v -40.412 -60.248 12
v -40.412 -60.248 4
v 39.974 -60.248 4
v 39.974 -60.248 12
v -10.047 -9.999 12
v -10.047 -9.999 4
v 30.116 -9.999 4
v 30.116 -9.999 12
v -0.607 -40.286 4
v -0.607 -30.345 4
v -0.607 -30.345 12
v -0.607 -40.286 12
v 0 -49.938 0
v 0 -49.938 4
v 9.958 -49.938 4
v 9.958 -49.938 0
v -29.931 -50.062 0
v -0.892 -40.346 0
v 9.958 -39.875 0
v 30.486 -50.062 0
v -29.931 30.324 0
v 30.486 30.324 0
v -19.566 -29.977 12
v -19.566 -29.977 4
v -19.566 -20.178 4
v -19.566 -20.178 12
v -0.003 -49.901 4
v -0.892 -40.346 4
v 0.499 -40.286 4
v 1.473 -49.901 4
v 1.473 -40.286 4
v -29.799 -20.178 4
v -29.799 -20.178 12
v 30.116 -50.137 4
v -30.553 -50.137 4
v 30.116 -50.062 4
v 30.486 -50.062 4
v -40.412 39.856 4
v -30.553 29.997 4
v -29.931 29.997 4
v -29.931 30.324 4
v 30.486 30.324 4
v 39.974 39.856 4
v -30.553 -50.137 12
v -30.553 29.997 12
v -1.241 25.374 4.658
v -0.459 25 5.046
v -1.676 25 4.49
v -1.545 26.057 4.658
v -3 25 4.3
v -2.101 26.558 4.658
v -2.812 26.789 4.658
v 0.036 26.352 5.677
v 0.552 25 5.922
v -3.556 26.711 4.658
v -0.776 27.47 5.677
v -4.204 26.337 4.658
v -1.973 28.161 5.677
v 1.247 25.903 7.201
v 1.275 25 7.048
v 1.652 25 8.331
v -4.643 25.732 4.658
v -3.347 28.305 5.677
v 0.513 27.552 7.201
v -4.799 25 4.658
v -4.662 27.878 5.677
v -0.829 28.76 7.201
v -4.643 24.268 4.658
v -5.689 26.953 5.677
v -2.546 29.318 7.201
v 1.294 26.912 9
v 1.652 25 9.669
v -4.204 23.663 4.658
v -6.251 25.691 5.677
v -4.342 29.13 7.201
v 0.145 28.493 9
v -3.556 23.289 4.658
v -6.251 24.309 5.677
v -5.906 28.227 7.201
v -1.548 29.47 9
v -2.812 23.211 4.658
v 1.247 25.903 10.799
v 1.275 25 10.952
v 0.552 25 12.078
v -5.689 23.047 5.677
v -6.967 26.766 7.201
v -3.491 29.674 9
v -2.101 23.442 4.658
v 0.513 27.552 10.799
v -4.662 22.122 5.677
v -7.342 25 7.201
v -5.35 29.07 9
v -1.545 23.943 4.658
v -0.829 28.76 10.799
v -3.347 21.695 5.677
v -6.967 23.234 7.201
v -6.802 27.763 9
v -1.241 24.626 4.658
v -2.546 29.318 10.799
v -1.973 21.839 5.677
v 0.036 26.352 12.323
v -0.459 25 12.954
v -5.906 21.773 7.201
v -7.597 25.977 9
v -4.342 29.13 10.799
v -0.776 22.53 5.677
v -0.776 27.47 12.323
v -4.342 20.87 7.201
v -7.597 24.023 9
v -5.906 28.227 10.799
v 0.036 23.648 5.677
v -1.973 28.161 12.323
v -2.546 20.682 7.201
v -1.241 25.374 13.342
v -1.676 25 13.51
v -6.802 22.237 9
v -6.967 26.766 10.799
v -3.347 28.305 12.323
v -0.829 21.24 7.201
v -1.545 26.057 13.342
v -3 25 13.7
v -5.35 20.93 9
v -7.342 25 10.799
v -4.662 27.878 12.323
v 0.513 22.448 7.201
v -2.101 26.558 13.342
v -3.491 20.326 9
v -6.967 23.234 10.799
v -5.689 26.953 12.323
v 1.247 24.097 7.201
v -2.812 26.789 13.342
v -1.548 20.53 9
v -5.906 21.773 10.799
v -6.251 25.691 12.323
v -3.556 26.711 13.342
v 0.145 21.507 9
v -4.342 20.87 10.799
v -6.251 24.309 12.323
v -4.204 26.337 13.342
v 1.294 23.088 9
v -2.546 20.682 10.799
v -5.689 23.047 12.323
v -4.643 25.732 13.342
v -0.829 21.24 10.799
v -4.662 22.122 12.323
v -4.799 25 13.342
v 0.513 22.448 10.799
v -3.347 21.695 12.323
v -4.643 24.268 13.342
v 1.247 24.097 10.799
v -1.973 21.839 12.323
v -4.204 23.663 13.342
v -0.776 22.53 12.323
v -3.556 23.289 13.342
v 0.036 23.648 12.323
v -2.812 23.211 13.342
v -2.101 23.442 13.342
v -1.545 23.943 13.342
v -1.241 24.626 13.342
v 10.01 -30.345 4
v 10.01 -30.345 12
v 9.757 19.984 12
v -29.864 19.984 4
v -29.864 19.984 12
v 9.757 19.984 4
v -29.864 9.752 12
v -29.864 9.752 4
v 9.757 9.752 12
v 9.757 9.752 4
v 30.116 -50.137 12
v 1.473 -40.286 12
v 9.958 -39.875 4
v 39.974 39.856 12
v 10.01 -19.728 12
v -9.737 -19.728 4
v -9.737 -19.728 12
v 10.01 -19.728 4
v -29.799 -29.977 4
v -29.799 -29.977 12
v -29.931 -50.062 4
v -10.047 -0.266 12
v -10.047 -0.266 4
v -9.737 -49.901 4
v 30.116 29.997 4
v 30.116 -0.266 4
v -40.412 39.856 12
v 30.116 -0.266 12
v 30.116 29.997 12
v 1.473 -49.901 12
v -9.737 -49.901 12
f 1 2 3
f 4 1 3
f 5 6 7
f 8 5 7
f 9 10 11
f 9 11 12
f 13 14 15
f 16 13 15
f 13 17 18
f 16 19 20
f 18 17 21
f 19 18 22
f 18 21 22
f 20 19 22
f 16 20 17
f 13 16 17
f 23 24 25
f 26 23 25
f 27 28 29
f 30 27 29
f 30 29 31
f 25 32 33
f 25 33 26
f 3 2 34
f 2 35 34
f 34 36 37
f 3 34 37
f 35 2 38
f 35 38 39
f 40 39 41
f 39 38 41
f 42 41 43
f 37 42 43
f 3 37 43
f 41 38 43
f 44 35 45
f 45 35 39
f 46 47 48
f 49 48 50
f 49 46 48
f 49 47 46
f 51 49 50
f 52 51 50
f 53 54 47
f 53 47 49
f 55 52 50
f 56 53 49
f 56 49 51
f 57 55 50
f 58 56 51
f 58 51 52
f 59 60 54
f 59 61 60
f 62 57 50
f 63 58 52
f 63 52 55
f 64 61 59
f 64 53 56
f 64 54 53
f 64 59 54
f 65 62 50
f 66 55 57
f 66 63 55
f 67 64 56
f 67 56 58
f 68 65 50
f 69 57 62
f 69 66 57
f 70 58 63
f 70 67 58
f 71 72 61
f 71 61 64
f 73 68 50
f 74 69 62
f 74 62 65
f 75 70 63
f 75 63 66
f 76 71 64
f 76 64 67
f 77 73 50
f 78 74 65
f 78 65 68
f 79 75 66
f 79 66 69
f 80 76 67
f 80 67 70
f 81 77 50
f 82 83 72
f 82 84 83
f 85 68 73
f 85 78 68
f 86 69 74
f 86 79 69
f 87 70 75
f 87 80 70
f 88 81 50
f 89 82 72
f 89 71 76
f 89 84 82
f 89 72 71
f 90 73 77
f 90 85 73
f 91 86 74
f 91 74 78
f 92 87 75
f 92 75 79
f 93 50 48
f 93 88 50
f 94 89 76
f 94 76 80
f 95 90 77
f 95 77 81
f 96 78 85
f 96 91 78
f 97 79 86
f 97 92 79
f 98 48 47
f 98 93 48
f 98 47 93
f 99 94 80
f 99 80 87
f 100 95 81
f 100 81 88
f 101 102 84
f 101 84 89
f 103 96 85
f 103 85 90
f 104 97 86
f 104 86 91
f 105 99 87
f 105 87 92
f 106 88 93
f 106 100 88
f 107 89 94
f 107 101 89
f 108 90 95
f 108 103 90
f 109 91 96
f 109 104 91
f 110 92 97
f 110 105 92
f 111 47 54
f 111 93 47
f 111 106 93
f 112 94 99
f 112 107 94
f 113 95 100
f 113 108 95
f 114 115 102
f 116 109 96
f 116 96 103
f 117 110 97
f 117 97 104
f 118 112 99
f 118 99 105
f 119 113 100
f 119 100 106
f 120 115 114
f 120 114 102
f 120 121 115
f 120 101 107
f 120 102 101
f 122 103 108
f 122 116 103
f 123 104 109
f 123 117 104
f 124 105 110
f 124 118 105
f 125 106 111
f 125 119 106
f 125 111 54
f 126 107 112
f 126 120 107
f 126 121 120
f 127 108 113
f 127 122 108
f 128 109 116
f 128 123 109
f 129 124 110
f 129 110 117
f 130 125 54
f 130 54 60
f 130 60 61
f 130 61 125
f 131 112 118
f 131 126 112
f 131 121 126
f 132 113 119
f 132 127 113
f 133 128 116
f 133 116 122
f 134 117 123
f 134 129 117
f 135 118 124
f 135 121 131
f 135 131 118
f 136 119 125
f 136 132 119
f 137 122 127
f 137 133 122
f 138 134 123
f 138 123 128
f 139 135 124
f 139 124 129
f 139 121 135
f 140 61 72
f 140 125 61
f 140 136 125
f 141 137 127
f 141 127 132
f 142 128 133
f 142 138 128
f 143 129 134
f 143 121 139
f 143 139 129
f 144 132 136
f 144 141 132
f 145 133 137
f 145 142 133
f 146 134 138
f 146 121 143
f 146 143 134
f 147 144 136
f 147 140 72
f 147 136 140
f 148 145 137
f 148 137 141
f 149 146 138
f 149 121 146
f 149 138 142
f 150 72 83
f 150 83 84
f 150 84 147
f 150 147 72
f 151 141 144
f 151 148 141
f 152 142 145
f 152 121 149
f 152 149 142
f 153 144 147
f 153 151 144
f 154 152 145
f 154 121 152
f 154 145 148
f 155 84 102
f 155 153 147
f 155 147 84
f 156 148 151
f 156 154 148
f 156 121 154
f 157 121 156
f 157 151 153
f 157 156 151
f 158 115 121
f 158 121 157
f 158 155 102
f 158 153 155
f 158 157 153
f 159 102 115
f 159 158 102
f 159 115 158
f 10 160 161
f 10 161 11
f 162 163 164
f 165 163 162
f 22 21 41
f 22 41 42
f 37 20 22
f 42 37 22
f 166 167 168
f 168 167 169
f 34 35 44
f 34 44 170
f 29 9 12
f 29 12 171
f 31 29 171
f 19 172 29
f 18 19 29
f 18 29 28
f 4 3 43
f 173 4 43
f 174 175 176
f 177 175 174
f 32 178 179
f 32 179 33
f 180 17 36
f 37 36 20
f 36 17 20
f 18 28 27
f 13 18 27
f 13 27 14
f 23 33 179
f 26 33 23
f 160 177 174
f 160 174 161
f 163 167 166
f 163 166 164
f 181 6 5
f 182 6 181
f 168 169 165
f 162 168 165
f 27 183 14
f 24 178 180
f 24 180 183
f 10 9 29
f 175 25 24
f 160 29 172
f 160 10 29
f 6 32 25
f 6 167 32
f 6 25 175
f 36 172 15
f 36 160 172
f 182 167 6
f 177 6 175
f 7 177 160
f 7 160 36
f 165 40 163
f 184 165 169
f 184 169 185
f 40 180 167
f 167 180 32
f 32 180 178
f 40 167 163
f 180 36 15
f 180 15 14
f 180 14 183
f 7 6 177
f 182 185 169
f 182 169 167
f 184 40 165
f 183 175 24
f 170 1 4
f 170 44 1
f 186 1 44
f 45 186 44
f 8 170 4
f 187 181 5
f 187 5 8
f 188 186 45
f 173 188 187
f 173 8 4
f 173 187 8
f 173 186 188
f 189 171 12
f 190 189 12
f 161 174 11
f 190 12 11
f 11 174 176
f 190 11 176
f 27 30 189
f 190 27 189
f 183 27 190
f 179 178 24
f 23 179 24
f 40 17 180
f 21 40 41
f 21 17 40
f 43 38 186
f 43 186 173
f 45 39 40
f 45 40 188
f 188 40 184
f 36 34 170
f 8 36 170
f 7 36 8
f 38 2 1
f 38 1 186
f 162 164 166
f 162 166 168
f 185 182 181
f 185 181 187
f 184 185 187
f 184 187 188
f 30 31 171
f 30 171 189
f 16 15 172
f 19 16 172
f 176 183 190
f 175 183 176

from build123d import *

# Parameters (mm, degrees)
SKETCH_W      = 60.416231
SKETCH_H      = 80.386448
PAD_DEPTH     = 4
SKETCH001_W   = 39.621
SKETCH001_H   = 10.23228
SKETCH001_W_2 = 40.450142
SKETCH001_H_2 = 9.733288
SKETCH001_W_3 = 10.233118
SKETCH001_H_3 = 9.79864
PAD001_DEPTH  = 8
SKETCH002_W   = 80.386456
SKETCH002_H   = 100.103886
SKETCH002_W_2 = 60.66902
SKETCH002_H_2 = 80.133665
PAD002_DEPTH  = 8
POCKET_DEPTH  = 12


with BuildPart() as body:
    # Sketch → Pad (new body)
    with BuildSketch(Plane.XY):
        with Locations((0.277603, -9.869257)):
            Rectangle(SKETCH_W, SKETCH_H)
    extrude(amount=PAD_DEPTH)

    # Sketch001 (on Face6 of Pad) → Pad001 (join)
    with BuildSketch(Plane.XY.offset(4)):
        with Locations((-10.053363, 14.867972)):
            Rectangle(SKETCH001_W, SKETCH001_H)
        with Locations((10.178181, -5.132365)):
            Rectangle(SKETCH001_W_2, SKETCH001_H_2)
        Polygon((-9.736984, -49.900822), (-9.736984, -19.727972), (10.009927, -19.727972), (10.009927, -30.345051), (-0.607156, -30.345051), (-0.607156, -40.285923), (1.472934, -40.285923), (1.472934, -49.900822), align=None)
        with Locations((-24.68278, -25.077216)):
            Rectangle(SKETCH001_W_3, SKETCH001_H_3)
    extrude(amount=PAD001_DEPTH)

    # Sketch002 (on Face5 of Pad001) → Pad002 (join)
    with BuildSketch(Plane.XY.offset(4)):
        with Locations((-0.218813, -10.196108)):
            Rectangle(SKETCH002_W, SKETCH002_H)
        with Locations((-0.218814, -10.069714)):
            Rectangle(SKETCH002_W_2, SKETCH002_H_2, mode=Mode.SUBTRACT)
    extrude(amount=PAD002_DEPTH)

    # Sketch003 (on Face7 of Pad002) → Pocket (cut)
    with BuildSketch(Plane.XY.offset(4)):
        Polygon((-0.891509, -40.346394), (0, -49.938282), (9.958334, -49.938282), (9.958334, -39.87466), align=None)
    extrude(amount=-POCKET_DEPTH, mode=Mode.SUBTRACT)


with BuildPart() as sphere:
    # Sphere → Sphere (revolve)
    with BuildSketch(Plane(origin=(-3, 25, 9), x_dir=(1, 0, 0), z_dir=(0, -1, 0))):
        with BuildLine():
            ThreePointArc((0, -4.7), (4.7, 0), (0, 4.7))
            Line((0, 4.7), (0, -4.7))
        make_face()
    revolve(axis=Axis((-3, 25, 9), (0, 0, 1)))


solid = Compound([body.part, sphere.part])
